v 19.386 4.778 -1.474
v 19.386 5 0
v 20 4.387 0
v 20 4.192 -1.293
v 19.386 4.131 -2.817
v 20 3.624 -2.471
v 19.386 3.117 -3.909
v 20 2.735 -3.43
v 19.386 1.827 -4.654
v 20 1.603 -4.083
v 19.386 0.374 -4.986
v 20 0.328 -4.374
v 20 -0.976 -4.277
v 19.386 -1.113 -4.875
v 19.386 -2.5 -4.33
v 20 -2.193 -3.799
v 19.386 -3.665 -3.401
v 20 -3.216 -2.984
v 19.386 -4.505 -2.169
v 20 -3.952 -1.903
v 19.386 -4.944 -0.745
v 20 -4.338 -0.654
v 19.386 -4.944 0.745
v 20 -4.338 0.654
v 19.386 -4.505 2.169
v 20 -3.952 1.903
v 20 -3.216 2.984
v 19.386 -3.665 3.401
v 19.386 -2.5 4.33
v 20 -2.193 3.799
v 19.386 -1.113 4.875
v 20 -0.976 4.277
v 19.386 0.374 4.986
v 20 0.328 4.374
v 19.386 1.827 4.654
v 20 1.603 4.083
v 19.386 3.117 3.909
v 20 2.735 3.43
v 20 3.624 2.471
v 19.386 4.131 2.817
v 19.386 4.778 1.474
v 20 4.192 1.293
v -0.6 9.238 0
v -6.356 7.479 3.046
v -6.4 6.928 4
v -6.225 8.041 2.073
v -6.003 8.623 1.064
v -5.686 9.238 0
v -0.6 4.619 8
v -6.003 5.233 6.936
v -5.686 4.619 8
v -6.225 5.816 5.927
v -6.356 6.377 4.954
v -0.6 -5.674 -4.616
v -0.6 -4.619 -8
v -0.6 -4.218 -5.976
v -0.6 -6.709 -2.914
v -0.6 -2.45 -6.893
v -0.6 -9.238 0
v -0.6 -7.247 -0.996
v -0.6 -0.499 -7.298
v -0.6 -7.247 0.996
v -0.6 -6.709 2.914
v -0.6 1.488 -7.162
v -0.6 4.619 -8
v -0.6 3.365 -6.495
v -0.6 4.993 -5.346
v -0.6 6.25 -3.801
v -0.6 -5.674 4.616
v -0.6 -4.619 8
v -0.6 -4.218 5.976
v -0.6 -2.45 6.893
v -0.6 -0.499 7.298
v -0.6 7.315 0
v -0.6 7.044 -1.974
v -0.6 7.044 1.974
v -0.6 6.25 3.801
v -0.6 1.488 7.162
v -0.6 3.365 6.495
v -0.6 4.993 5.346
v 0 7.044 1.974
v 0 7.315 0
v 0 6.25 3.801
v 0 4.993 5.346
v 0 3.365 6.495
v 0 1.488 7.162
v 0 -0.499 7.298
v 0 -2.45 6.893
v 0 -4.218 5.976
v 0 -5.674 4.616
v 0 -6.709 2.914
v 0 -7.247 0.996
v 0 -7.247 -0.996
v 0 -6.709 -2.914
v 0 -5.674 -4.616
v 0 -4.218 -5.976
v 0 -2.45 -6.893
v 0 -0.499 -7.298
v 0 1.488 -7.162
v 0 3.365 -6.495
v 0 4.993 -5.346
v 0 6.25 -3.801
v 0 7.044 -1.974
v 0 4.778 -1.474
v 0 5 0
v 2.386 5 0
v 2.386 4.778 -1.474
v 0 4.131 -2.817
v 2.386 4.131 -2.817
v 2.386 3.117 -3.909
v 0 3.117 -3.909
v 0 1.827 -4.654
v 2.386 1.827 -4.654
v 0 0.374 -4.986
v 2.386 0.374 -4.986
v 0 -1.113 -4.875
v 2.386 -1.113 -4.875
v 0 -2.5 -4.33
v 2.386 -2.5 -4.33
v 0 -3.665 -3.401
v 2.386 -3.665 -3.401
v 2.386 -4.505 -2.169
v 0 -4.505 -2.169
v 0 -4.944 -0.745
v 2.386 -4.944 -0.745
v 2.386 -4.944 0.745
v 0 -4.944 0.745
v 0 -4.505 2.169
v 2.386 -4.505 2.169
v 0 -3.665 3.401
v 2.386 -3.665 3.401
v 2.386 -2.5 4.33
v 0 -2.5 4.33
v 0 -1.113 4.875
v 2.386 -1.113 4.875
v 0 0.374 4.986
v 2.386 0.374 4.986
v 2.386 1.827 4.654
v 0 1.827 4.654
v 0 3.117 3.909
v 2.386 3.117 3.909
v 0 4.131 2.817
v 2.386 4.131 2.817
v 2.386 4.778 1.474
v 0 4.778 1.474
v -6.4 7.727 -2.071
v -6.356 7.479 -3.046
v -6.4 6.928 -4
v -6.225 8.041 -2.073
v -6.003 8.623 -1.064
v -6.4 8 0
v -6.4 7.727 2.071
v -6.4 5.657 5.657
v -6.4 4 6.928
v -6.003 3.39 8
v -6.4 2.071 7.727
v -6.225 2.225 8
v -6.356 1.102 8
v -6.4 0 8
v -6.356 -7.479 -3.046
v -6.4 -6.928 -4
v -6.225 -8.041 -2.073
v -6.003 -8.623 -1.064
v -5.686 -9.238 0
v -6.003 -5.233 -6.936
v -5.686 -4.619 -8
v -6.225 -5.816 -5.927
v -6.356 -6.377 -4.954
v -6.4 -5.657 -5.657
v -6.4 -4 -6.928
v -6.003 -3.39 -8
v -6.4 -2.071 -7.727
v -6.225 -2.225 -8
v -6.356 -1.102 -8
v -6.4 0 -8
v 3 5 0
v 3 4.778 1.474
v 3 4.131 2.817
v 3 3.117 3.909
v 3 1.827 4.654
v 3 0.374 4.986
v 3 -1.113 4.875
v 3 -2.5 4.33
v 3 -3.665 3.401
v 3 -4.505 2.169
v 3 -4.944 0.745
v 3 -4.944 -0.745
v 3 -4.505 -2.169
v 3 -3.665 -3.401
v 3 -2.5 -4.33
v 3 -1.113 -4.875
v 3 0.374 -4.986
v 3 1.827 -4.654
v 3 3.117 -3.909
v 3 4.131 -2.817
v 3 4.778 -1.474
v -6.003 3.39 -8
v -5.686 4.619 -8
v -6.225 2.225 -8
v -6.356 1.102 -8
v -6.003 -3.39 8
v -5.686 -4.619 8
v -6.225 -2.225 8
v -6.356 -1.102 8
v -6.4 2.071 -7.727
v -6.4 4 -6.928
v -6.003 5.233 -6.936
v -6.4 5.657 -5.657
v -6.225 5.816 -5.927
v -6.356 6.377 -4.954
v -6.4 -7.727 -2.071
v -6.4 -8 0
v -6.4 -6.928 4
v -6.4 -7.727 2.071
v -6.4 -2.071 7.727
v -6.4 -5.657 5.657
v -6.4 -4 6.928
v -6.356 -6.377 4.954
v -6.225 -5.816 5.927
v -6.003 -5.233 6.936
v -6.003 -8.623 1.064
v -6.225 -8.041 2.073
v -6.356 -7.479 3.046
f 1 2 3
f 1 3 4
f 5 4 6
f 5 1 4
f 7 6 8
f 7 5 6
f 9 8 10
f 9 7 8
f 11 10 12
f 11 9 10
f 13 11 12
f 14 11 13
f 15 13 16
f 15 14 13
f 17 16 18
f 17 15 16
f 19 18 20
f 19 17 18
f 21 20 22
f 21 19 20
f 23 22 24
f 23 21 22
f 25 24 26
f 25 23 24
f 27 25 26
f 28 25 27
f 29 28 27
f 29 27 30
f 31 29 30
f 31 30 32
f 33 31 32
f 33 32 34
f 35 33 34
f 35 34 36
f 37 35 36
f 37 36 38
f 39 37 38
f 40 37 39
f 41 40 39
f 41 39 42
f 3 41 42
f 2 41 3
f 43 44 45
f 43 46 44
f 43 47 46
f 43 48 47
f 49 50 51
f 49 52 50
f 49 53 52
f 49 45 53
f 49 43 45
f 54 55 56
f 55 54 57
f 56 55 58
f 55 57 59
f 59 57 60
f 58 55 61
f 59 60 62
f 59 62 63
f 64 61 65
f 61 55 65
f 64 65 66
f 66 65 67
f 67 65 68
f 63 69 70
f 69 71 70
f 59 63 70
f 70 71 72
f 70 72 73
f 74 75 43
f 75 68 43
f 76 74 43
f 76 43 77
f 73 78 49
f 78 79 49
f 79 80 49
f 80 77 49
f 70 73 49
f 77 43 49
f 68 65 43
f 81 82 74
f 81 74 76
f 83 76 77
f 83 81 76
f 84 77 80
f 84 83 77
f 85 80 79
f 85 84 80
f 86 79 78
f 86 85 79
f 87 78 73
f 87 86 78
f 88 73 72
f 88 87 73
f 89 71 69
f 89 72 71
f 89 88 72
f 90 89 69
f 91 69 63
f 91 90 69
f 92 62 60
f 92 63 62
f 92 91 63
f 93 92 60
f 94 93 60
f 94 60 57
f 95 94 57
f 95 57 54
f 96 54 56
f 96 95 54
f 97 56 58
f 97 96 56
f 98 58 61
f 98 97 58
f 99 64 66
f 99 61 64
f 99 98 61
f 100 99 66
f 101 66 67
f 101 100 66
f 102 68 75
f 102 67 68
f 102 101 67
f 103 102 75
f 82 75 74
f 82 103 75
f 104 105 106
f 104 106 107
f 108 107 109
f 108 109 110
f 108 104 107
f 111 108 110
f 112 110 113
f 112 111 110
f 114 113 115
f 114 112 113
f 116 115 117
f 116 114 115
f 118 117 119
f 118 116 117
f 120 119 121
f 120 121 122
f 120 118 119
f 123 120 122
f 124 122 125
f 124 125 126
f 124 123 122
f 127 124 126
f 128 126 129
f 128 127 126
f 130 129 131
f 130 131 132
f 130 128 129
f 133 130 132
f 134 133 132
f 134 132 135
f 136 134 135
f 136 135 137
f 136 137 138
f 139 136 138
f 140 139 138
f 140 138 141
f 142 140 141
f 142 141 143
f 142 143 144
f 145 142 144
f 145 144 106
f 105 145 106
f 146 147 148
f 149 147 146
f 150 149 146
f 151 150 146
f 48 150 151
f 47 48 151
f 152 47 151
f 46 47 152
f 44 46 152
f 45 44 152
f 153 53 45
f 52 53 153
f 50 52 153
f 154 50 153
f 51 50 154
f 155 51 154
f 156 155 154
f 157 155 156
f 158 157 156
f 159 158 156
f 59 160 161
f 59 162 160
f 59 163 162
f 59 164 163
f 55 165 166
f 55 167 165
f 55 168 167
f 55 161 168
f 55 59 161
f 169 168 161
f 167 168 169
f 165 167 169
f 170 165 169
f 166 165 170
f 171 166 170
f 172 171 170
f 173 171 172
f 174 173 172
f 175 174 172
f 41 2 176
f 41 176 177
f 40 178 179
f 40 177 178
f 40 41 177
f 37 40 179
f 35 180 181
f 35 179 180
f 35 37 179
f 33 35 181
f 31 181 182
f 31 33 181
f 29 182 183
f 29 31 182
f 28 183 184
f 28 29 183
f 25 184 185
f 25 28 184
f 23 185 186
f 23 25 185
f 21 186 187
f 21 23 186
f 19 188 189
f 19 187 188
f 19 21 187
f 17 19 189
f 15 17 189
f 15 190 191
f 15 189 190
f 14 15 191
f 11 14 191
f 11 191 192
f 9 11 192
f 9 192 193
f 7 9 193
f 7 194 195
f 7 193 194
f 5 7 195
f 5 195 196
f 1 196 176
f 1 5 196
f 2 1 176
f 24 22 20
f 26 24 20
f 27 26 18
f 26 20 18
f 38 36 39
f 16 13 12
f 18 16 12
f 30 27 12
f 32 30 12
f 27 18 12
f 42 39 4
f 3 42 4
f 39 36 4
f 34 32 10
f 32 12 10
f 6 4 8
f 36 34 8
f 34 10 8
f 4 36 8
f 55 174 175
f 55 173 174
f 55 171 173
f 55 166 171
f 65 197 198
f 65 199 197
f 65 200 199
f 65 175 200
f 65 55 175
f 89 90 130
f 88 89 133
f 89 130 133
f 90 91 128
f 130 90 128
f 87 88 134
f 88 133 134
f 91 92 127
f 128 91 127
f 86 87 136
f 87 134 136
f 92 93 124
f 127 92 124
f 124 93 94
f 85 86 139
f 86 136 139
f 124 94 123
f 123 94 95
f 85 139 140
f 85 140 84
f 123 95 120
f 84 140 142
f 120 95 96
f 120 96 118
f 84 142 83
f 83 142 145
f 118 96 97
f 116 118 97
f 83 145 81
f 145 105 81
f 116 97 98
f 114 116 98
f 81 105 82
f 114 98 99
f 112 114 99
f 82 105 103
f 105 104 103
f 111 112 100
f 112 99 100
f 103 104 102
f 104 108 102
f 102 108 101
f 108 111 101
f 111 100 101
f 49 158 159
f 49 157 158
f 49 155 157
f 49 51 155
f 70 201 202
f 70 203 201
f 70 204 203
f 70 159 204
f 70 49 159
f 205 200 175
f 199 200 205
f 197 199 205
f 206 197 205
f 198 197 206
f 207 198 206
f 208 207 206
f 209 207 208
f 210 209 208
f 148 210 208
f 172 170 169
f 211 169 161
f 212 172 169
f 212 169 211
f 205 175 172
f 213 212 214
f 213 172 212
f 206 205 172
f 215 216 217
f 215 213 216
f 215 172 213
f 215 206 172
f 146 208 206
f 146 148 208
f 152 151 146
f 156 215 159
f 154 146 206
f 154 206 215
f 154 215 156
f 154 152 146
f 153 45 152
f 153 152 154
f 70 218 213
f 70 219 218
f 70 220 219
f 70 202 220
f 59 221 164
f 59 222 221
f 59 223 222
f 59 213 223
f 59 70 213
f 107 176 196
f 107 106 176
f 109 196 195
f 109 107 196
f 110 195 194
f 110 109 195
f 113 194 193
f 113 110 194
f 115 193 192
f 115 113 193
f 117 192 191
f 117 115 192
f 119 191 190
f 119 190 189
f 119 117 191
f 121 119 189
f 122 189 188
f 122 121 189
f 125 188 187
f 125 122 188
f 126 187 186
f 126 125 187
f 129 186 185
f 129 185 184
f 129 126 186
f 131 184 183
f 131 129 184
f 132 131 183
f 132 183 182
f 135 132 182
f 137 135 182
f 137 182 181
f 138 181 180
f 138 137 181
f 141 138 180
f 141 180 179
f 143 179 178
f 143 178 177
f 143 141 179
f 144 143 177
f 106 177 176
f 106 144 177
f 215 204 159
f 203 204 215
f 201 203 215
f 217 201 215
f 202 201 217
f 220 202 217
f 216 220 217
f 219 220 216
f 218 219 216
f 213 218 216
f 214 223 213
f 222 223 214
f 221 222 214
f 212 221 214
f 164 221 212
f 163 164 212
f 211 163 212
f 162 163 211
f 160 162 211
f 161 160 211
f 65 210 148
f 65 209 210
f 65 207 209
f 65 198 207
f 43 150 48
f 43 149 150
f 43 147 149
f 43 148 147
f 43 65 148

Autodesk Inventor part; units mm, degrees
ref_plane "YZ Plane" through (0, 0, 0) normal (1, 0, 0) x (0, 1, 0)
ref_plane "XZ Plane" through (0, 0, 0) normal (0, 1, 0) x (-1, 0, 0)
sketch "Sketch1" plane through (0, 0, 0) normal (0, 0, 1) x (1, 0, 0)
  line L0 (0, 7.315) -> (0, 5)
  line L1 (3, 5) -> (20, 5)
  line L2 (20, 5) -> (20, 0)
  line L3 (20, 0) -> (-0.6001, 0)
  line L4 (-4.7201, 0) -> (24.12, 0) projected
  line L5 (-0.6001, 0) -> (-0.6001, 7.315)
  line L6 (-0.6001, 7.315) -> (0, 7.315)
  line L7 (3, 5) -> (2.3865, 5)
  line L8 (2.3865, 5) -> (0, 5)
  line L9 (0, -1.463) -> (0, 8.778) projected
  dimension "d0" = 20
  dimension "d1" = 17
  dimension "d2" = 10
  dimension "d9" = 0.6001
  dimension "d10" = 14.63
  dimension "d13" = 0.6136
  dimension "d14" = 10
revolve "Body" add sketch "Sketch1" angle 360 about axis through (20, 0, 0) along (-1, 0, 0)
sketch "Sketch2" plane through (-0.6001, 0, 0) normal (-1, 0, 0) x (0, 0, 1)
  line L0 (0, 9.2376) -> (8, 4.6188)
  line L1 (8, 4.6188) -> (8, -4.6188)
  line L2 (8, -4.6188) -> (0, -9.2376)
  line L3 (0, -9.2376) -> (-8, -4.6188)
  line L4 (-8, -4.6188) -> (-8, 4.6188)
  line L5 (-8, 4.6188) -> (0, 9.2376)
  point P0 (0, 0)
  point P1 (0, 0)
  dimension "d11" = 16
extrude "Head" add sketch "Sketch2" along normal blind 5.8
sketch "Sketch4" plane through (0, 0, 0) normal (0, 0, 1) x (1, 0, 0)
  line L0 (-6.4001, 8) -> (-6.4001, 9.2376)
  line L1 (-6.4001, 9.2376) -> (-5.6856, 9.2376)
  line L2 (-5.6856, 9.2376) -> (-6.4001, 8)
  line L3 (-7.5601, 0) -> (0.5599, 0) projected
  line L4 (-0.6001, 9.2376) -> (-6.4001, 9.2376) projected
  line L5 (-6.4001, 4.6188) -> (-6.4001, 9.2376) projected
  dimension "d5" = 30
  dimension "d19" = 16
revolve "Chamfer1" cut sketch "Sketch4" angle 360 about axis through (-10, 0, 0) along (1, 0, 0)
thread "Thread" size "M10x1" class "6g" standard "ISO Metric profile" length 17
chamfer "Chamfer2" distance 0.6134 distance2 0.6136 1 edges at (20, -5, 0) measured on face at (20, -0.8193, 0.3214)
ref_plane "Work Plane1" through (1.525, 0, 0) normal (0, 0, 1) x (1, 0, 0)
equation "\"d0\" = NLG"
equation "\"d1\" = GEL"
equation "\"d2\" = GD"
equation "\"d10\" = SD2"
equation "\"d14\" = BDM"
equation "\"d11\" = SW"
equation "\"d3\" = KOH - SD"
equation "\"d5\" = ANG1"
equation "\"d19\" = SW0"
equation "\"d15\" = GEL"
equation "\"d6\" = -0.5 * SPD + 0.5 * GD"
equation "\"NLG\" = 20"
equation "\"GD\" = NND"
equation "\"BDM\" = NND"
equation "\"KOH\" = 6.4"
equation "\"GEL\" = 17"
equation "\"SW\" = 16"
equation "\"SW0\" = 16"
equation "\"SPD\" = NND - 1.2269 * PTC"
equation "\"SD2\" = 14.63"
equation "\"SD\" = 0.6"
equation "\"ANG1\" = 30deg"
equation "\"GAL\" = 0.61345 * PTC"
equation "\"GUL\" = 0.61345 * PTC"
equation "\"RR\" = 0.4"
equation "\"GD1\" = THREADDIA - 1.2269 * PTC"
equation "\"SDH\" = SD2"
equation "\"TOA\" = 30deg"
equation "\"PTC\" = 1"
equation "\"E0\" = 1.155 * SW"
equation "\"NND\" = 10"
equation "\"THREADDIA\" = 10"
properties part number "ISO 8676 - M10 x 1 x 20" material "Stainless Steel, 440C"
